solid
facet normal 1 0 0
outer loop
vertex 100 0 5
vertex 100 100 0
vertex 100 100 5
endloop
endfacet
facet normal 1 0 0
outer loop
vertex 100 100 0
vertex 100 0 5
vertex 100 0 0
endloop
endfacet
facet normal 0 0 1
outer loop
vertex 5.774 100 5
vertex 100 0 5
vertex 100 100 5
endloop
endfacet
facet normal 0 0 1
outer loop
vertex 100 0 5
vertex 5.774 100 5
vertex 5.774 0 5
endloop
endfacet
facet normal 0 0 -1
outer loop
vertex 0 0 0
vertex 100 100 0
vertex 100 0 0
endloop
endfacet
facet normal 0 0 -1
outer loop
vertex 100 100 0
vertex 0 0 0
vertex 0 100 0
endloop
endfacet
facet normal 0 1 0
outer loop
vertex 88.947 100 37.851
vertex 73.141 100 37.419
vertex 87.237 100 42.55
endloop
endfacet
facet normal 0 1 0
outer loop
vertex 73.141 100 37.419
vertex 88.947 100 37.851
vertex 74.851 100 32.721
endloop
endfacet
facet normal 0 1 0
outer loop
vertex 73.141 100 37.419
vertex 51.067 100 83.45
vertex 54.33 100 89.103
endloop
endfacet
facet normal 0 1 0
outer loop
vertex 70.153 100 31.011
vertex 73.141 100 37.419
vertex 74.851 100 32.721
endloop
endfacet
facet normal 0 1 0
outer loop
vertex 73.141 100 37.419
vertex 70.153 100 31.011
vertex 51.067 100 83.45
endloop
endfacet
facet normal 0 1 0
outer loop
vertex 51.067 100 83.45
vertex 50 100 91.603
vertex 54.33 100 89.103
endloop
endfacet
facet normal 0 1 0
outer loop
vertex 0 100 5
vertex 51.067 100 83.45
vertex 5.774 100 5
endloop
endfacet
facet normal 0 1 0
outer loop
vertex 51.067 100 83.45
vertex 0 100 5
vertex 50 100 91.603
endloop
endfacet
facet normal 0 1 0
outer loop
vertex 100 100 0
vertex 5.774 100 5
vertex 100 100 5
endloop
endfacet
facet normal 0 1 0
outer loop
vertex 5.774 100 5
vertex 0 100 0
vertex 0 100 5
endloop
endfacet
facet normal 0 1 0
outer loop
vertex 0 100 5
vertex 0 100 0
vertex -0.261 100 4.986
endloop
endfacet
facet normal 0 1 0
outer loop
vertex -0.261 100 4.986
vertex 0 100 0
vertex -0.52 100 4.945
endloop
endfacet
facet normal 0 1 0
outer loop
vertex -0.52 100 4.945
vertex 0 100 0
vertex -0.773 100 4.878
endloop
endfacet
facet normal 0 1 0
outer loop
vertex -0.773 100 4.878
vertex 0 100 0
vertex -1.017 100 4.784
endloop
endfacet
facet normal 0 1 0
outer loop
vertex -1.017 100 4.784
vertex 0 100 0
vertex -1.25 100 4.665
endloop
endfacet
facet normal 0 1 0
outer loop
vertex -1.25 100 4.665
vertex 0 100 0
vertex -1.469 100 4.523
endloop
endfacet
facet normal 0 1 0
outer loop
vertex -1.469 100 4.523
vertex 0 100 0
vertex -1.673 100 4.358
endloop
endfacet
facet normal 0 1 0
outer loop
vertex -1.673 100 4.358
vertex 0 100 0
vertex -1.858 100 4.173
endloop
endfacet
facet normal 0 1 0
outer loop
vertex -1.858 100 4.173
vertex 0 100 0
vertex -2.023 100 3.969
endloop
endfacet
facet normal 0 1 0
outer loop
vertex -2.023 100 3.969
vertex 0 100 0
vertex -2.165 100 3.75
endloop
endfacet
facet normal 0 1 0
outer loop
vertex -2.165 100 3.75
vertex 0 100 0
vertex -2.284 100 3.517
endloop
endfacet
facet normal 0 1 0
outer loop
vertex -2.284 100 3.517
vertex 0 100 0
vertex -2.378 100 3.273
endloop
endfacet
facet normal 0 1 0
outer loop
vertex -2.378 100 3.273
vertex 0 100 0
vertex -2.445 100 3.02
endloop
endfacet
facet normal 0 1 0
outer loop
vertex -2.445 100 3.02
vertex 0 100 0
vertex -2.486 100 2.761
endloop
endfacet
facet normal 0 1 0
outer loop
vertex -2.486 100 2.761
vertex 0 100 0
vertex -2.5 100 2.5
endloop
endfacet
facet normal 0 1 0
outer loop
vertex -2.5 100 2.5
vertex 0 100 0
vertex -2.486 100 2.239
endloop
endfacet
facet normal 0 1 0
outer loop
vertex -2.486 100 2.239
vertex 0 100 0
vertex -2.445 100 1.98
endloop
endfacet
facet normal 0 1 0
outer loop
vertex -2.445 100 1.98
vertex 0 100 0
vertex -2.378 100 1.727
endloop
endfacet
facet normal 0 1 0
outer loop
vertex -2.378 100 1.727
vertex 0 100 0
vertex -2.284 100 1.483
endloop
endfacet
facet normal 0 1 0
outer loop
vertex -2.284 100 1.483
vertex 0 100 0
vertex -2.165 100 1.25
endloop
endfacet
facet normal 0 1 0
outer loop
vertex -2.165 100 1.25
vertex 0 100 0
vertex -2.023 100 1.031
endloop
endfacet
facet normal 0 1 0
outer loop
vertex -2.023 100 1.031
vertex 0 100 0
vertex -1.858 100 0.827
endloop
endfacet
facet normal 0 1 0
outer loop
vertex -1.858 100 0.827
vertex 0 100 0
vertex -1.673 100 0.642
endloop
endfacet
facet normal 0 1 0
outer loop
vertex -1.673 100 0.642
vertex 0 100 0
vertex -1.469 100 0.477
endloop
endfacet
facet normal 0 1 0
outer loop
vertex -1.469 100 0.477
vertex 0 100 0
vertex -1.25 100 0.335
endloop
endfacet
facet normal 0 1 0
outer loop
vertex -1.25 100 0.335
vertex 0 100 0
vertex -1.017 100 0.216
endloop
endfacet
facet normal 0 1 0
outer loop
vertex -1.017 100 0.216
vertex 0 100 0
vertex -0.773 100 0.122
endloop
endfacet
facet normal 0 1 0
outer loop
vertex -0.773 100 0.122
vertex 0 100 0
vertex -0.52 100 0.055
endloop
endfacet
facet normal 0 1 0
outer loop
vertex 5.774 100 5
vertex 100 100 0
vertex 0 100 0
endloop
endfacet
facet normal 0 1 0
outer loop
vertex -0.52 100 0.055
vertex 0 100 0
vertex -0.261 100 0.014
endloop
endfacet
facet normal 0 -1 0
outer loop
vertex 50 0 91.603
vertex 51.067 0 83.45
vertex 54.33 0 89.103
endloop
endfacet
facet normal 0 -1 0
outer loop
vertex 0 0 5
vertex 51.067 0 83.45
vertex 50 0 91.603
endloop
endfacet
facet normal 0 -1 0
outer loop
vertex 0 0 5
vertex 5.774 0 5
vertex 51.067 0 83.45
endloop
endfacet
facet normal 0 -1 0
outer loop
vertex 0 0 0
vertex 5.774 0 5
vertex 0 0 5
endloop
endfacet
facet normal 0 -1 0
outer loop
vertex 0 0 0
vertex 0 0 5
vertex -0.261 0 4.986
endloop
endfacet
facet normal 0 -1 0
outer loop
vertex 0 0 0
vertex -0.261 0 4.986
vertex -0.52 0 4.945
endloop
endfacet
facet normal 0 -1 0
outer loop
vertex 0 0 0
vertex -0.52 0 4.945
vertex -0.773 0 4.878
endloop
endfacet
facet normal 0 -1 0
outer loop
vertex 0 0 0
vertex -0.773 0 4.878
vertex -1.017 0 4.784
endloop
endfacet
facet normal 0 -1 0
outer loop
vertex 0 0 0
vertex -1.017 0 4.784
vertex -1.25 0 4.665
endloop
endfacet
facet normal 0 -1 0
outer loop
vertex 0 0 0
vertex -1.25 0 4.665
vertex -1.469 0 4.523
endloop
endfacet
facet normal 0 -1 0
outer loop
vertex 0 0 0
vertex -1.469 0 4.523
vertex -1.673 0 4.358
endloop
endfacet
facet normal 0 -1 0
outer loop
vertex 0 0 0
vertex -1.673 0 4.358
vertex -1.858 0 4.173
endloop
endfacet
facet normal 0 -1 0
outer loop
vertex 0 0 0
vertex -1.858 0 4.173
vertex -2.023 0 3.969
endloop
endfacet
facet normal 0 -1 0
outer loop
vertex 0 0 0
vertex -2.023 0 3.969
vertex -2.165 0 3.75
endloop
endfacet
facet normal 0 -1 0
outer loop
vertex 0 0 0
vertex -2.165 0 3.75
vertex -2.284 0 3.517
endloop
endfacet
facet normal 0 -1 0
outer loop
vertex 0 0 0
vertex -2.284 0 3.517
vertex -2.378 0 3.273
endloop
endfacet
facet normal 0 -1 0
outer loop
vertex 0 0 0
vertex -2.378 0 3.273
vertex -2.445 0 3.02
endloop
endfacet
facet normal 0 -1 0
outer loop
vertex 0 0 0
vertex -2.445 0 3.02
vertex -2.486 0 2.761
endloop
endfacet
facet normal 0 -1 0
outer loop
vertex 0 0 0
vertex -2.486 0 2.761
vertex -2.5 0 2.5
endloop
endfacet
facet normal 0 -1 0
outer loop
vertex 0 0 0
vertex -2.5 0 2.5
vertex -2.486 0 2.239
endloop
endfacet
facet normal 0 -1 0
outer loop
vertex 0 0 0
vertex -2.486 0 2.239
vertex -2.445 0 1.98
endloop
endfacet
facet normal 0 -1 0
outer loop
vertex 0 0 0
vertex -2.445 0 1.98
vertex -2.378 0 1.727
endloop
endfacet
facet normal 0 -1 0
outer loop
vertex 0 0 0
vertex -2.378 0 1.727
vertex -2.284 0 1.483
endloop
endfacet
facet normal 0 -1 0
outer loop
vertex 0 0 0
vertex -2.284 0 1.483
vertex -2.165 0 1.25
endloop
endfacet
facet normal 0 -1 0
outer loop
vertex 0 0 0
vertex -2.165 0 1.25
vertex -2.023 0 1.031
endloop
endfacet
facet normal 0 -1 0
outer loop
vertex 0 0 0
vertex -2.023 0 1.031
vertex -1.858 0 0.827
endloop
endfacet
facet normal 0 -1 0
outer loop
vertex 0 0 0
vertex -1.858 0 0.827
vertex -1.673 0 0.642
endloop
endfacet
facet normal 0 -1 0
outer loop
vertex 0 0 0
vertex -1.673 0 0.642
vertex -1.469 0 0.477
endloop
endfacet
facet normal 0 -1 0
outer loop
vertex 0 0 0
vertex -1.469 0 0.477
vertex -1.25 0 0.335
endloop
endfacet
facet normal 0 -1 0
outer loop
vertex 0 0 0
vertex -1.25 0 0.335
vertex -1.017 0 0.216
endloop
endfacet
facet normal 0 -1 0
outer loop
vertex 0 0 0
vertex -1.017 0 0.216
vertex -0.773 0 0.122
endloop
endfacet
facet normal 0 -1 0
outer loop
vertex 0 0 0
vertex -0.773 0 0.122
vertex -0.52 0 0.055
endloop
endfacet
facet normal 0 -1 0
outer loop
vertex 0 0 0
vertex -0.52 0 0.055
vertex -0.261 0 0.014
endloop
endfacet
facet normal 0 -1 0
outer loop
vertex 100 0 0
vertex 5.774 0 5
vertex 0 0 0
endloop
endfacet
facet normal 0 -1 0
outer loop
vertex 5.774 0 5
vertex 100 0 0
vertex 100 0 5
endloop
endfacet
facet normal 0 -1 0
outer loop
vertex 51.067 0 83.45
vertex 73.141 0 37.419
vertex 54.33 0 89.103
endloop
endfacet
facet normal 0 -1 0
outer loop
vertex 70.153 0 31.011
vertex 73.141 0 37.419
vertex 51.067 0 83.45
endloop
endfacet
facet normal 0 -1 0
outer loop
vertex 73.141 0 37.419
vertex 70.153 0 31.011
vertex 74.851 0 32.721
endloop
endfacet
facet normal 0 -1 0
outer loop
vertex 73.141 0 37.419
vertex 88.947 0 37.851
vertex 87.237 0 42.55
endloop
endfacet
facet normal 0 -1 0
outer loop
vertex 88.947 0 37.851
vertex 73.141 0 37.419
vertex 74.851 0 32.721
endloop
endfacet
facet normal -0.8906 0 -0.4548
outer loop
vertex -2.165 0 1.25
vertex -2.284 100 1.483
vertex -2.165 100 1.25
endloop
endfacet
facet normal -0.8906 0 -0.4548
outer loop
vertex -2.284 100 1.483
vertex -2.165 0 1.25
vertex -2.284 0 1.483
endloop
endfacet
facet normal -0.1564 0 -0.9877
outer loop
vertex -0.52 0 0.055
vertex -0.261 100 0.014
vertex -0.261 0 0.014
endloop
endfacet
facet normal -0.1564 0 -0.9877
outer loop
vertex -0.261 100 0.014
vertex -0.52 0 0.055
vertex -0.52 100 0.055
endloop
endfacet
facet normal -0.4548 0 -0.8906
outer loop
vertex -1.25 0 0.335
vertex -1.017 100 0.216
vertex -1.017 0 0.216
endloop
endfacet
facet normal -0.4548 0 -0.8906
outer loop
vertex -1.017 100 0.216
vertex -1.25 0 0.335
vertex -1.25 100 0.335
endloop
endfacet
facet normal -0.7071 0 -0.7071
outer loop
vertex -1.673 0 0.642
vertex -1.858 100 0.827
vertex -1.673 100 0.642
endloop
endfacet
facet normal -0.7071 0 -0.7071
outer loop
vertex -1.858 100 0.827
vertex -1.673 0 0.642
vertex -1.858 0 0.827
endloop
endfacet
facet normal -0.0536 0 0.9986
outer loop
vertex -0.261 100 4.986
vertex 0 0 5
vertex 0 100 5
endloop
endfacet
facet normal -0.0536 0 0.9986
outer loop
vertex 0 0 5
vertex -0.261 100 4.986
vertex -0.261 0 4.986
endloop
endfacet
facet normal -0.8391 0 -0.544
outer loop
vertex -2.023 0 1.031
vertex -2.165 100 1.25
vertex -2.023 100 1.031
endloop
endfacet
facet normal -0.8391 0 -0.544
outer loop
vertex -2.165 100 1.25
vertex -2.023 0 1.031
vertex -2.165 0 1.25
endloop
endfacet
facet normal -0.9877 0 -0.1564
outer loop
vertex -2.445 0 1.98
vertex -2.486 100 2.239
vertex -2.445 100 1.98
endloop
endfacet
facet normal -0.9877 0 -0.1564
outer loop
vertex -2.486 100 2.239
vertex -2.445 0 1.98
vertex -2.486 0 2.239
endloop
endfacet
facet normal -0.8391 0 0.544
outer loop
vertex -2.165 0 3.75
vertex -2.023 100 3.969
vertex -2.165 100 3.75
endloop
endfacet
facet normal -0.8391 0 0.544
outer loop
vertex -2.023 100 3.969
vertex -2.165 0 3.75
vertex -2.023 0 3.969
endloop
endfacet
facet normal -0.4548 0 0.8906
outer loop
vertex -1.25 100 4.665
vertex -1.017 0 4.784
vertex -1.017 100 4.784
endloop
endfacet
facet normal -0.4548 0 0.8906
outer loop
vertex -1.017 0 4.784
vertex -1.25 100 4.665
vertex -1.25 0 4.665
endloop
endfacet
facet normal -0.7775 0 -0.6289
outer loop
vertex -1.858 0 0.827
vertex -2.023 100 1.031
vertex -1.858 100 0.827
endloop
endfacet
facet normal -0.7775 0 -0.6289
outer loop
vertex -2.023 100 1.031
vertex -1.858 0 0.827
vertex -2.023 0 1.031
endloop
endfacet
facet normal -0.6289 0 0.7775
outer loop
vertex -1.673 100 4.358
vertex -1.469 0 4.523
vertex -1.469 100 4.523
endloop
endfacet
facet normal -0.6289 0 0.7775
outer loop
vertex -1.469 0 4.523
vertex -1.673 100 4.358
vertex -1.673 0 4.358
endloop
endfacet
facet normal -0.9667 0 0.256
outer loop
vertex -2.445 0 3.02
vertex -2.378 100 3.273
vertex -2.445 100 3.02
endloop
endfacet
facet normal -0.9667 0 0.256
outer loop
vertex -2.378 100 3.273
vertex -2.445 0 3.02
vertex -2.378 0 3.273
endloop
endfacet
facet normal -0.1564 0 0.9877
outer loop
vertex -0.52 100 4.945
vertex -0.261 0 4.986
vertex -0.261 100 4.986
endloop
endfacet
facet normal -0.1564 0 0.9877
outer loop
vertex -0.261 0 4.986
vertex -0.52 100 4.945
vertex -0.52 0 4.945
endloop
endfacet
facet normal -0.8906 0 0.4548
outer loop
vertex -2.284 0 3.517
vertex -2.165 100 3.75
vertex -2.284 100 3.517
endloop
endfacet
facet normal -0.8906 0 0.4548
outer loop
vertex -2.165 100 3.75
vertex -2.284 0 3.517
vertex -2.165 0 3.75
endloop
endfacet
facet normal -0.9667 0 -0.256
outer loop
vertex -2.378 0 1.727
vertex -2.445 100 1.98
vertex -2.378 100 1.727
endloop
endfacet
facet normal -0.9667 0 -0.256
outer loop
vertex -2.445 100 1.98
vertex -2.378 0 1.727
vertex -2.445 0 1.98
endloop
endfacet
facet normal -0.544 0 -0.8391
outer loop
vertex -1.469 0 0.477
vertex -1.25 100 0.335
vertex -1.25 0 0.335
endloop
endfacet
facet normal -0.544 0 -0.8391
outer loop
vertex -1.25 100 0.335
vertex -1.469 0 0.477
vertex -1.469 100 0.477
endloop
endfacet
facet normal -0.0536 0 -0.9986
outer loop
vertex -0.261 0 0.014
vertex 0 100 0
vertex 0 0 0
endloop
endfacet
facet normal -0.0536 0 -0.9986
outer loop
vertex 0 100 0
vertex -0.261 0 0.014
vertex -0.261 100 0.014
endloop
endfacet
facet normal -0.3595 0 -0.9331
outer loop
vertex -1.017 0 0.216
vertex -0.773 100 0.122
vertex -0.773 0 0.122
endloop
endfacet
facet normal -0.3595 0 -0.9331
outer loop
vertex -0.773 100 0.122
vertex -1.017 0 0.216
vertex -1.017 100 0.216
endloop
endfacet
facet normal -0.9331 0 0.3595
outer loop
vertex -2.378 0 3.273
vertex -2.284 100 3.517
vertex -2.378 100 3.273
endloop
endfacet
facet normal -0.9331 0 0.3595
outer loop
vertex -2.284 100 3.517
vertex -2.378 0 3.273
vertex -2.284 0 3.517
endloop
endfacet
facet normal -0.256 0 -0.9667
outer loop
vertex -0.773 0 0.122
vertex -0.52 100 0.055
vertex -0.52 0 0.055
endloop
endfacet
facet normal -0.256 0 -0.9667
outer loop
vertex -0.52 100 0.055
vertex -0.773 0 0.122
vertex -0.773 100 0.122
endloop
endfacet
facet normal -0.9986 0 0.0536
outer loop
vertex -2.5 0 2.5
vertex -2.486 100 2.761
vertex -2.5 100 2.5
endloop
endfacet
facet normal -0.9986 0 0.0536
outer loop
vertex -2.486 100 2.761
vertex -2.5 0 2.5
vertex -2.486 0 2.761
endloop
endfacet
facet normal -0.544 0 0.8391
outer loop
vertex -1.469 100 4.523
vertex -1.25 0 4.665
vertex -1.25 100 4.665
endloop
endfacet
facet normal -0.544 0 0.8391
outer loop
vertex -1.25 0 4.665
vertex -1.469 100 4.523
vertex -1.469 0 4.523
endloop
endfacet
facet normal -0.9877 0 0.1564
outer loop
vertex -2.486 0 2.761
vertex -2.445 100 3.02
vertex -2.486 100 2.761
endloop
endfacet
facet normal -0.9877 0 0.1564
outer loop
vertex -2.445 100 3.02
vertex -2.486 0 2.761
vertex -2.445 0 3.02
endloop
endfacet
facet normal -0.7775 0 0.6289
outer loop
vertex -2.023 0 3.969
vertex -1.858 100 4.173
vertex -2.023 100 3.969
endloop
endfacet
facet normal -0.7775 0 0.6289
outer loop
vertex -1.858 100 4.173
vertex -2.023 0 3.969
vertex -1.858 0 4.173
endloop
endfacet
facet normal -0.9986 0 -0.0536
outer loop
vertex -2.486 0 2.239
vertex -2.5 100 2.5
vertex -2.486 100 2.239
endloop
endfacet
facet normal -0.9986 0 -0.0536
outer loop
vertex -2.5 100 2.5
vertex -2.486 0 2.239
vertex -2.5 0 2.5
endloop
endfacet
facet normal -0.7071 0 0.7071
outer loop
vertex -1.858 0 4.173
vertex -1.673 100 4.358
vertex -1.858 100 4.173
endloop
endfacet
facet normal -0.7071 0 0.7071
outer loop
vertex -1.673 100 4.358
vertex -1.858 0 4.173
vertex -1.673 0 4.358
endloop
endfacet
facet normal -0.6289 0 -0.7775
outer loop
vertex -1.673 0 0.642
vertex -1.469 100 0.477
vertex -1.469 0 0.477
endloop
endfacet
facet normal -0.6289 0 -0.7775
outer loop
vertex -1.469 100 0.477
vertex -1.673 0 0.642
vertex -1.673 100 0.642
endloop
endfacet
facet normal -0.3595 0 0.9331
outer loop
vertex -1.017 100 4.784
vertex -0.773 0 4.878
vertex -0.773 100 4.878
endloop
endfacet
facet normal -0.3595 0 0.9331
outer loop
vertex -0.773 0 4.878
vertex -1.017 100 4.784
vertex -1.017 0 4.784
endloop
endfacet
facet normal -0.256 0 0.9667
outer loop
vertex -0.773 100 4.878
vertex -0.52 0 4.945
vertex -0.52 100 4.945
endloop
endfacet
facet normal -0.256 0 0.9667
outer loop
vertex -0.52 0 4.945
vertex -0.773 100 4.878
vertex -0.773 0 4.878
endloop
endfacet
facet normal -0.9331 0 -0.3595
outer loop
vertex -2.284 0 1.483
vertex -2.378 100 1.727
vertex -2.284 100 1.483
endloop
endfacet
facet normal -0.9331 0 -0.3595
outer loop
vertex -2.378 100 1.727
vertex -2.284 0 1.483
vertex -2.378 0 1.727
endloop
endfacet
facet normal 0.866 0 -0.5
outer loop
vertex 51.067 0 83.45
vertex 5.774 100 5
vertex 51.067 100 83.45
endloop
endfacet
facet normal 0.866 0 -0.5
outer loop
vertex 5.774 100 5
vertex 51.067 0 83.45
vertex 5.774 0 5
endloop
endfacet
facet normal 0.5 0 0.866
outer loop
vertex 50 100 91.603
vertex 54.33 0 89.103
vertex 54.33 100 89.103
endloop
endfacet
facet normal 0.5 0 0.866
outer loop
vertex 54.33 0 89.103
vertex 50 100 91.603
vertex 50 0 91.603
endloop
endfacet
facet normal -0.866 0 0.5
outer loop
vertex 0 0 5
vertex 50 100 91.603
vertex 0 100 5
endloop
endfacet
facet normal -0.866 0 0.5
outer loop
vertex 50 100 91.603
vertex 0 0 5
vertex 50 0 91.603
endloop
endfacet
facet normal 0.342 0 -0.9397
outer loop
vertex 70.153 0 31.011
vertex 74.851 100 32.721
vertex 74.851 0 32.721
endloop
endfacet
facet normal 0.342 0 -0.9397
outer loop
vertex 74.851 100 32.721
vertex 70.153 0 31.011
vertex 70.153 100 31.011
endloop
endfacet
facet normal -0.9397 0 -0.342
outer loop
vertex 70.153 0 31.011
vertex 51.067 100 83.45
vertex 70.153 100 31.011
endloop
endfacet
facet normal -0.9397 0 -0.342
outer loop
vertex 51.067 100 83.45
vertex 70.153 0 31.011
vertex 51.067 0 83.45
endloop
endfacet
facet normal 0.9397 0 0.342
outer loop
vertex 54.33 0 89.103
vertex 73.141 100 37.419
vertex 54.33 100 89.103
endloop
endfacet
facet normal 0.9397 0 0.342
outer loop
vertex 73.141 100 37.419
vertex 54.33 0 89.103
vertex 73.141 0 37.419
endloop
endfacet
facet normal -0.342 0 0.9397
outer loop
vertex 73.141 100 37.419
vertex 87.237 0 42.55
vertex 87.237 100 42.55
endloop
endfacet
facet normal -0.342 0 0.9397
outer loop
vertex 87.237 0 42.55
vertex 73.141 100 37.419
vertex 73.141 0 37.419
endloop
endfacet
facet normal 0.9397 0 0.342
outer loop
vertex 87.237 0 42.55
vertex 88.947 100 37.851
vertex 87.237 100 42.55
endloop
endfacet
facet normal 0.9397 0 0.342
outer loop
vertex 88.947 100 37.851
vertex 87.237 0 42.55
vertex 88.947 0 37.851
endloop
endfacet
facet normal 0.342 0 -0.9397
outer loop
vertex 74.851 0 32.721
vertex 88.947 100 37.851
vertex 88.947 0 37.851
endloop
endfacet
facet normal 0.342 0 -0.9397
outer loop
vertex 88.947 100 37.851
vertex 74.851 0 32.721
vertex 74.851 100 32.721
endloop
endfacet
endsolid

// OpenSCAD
// variables in mm
bottomStand = 100;
backSlant = 100;
frontSlant = 60;

inlayWidth = 15;
phoneBump = 5;

standDepth = 100;
sideWidth = 5;

backAngle = 30;	// less than 90
frontAngle = 160;	// larger than 90

// ____________________________________
//
// Calculated variables
// ____________________________________


// dimensions
bottomCube = [bottomStand, standDepth, sideWidth];
backCube = [sideWidth, standDepth, backSlant];
frontCube = [sideWidth, standDepth, frontSlant];

// angles
phoneAngle = frontAngle - 180;

// translations / offsets
backOffset = [0, 0, sideWidth];

frontOffset = [sin(backAngle)*(backSlant) + cos(backAngle)*sideWidth, 
		0, cos(backAngle)*(backSlant) + sin(backAngle)*sideWidth];
		
inlayOffset = [frontOffset.x + sin(frontAngle)*frontCube.z, 
		frontOffset.y, 
		frontOffset.z + cos(frontAngle)*frontCube.z];

// ______________________________________
//
// start drawing
// ______________________________________

$fn = 60;

// base
cube(bottomCube);

translate([0, 0, sideWidth/2])
{
	rotate([-90, 0, 0])
	{
		color("blue");
		
##		cylinder(d = sideWidth, h = standDepth);
	}
}

// backside 
translate(backOffset)
{
	rotate([0, backAngle, 0])
	{
		color("green")
		{
			cube(backCube);
		}
	}
}

// front
translate(frontOffset)
{
	rotate([0, frontAngle, 0])
	{
		color("red") 
		{
			cube(frontCube);
		}
	}
}

// inlay
translate(inlayOffset)
{
	rotate([0, phoneAngle, 0])
	{
		color("blue")
		{
			cube([inlayWidth, standDepth, sideWidth]);
		}
	}
}
